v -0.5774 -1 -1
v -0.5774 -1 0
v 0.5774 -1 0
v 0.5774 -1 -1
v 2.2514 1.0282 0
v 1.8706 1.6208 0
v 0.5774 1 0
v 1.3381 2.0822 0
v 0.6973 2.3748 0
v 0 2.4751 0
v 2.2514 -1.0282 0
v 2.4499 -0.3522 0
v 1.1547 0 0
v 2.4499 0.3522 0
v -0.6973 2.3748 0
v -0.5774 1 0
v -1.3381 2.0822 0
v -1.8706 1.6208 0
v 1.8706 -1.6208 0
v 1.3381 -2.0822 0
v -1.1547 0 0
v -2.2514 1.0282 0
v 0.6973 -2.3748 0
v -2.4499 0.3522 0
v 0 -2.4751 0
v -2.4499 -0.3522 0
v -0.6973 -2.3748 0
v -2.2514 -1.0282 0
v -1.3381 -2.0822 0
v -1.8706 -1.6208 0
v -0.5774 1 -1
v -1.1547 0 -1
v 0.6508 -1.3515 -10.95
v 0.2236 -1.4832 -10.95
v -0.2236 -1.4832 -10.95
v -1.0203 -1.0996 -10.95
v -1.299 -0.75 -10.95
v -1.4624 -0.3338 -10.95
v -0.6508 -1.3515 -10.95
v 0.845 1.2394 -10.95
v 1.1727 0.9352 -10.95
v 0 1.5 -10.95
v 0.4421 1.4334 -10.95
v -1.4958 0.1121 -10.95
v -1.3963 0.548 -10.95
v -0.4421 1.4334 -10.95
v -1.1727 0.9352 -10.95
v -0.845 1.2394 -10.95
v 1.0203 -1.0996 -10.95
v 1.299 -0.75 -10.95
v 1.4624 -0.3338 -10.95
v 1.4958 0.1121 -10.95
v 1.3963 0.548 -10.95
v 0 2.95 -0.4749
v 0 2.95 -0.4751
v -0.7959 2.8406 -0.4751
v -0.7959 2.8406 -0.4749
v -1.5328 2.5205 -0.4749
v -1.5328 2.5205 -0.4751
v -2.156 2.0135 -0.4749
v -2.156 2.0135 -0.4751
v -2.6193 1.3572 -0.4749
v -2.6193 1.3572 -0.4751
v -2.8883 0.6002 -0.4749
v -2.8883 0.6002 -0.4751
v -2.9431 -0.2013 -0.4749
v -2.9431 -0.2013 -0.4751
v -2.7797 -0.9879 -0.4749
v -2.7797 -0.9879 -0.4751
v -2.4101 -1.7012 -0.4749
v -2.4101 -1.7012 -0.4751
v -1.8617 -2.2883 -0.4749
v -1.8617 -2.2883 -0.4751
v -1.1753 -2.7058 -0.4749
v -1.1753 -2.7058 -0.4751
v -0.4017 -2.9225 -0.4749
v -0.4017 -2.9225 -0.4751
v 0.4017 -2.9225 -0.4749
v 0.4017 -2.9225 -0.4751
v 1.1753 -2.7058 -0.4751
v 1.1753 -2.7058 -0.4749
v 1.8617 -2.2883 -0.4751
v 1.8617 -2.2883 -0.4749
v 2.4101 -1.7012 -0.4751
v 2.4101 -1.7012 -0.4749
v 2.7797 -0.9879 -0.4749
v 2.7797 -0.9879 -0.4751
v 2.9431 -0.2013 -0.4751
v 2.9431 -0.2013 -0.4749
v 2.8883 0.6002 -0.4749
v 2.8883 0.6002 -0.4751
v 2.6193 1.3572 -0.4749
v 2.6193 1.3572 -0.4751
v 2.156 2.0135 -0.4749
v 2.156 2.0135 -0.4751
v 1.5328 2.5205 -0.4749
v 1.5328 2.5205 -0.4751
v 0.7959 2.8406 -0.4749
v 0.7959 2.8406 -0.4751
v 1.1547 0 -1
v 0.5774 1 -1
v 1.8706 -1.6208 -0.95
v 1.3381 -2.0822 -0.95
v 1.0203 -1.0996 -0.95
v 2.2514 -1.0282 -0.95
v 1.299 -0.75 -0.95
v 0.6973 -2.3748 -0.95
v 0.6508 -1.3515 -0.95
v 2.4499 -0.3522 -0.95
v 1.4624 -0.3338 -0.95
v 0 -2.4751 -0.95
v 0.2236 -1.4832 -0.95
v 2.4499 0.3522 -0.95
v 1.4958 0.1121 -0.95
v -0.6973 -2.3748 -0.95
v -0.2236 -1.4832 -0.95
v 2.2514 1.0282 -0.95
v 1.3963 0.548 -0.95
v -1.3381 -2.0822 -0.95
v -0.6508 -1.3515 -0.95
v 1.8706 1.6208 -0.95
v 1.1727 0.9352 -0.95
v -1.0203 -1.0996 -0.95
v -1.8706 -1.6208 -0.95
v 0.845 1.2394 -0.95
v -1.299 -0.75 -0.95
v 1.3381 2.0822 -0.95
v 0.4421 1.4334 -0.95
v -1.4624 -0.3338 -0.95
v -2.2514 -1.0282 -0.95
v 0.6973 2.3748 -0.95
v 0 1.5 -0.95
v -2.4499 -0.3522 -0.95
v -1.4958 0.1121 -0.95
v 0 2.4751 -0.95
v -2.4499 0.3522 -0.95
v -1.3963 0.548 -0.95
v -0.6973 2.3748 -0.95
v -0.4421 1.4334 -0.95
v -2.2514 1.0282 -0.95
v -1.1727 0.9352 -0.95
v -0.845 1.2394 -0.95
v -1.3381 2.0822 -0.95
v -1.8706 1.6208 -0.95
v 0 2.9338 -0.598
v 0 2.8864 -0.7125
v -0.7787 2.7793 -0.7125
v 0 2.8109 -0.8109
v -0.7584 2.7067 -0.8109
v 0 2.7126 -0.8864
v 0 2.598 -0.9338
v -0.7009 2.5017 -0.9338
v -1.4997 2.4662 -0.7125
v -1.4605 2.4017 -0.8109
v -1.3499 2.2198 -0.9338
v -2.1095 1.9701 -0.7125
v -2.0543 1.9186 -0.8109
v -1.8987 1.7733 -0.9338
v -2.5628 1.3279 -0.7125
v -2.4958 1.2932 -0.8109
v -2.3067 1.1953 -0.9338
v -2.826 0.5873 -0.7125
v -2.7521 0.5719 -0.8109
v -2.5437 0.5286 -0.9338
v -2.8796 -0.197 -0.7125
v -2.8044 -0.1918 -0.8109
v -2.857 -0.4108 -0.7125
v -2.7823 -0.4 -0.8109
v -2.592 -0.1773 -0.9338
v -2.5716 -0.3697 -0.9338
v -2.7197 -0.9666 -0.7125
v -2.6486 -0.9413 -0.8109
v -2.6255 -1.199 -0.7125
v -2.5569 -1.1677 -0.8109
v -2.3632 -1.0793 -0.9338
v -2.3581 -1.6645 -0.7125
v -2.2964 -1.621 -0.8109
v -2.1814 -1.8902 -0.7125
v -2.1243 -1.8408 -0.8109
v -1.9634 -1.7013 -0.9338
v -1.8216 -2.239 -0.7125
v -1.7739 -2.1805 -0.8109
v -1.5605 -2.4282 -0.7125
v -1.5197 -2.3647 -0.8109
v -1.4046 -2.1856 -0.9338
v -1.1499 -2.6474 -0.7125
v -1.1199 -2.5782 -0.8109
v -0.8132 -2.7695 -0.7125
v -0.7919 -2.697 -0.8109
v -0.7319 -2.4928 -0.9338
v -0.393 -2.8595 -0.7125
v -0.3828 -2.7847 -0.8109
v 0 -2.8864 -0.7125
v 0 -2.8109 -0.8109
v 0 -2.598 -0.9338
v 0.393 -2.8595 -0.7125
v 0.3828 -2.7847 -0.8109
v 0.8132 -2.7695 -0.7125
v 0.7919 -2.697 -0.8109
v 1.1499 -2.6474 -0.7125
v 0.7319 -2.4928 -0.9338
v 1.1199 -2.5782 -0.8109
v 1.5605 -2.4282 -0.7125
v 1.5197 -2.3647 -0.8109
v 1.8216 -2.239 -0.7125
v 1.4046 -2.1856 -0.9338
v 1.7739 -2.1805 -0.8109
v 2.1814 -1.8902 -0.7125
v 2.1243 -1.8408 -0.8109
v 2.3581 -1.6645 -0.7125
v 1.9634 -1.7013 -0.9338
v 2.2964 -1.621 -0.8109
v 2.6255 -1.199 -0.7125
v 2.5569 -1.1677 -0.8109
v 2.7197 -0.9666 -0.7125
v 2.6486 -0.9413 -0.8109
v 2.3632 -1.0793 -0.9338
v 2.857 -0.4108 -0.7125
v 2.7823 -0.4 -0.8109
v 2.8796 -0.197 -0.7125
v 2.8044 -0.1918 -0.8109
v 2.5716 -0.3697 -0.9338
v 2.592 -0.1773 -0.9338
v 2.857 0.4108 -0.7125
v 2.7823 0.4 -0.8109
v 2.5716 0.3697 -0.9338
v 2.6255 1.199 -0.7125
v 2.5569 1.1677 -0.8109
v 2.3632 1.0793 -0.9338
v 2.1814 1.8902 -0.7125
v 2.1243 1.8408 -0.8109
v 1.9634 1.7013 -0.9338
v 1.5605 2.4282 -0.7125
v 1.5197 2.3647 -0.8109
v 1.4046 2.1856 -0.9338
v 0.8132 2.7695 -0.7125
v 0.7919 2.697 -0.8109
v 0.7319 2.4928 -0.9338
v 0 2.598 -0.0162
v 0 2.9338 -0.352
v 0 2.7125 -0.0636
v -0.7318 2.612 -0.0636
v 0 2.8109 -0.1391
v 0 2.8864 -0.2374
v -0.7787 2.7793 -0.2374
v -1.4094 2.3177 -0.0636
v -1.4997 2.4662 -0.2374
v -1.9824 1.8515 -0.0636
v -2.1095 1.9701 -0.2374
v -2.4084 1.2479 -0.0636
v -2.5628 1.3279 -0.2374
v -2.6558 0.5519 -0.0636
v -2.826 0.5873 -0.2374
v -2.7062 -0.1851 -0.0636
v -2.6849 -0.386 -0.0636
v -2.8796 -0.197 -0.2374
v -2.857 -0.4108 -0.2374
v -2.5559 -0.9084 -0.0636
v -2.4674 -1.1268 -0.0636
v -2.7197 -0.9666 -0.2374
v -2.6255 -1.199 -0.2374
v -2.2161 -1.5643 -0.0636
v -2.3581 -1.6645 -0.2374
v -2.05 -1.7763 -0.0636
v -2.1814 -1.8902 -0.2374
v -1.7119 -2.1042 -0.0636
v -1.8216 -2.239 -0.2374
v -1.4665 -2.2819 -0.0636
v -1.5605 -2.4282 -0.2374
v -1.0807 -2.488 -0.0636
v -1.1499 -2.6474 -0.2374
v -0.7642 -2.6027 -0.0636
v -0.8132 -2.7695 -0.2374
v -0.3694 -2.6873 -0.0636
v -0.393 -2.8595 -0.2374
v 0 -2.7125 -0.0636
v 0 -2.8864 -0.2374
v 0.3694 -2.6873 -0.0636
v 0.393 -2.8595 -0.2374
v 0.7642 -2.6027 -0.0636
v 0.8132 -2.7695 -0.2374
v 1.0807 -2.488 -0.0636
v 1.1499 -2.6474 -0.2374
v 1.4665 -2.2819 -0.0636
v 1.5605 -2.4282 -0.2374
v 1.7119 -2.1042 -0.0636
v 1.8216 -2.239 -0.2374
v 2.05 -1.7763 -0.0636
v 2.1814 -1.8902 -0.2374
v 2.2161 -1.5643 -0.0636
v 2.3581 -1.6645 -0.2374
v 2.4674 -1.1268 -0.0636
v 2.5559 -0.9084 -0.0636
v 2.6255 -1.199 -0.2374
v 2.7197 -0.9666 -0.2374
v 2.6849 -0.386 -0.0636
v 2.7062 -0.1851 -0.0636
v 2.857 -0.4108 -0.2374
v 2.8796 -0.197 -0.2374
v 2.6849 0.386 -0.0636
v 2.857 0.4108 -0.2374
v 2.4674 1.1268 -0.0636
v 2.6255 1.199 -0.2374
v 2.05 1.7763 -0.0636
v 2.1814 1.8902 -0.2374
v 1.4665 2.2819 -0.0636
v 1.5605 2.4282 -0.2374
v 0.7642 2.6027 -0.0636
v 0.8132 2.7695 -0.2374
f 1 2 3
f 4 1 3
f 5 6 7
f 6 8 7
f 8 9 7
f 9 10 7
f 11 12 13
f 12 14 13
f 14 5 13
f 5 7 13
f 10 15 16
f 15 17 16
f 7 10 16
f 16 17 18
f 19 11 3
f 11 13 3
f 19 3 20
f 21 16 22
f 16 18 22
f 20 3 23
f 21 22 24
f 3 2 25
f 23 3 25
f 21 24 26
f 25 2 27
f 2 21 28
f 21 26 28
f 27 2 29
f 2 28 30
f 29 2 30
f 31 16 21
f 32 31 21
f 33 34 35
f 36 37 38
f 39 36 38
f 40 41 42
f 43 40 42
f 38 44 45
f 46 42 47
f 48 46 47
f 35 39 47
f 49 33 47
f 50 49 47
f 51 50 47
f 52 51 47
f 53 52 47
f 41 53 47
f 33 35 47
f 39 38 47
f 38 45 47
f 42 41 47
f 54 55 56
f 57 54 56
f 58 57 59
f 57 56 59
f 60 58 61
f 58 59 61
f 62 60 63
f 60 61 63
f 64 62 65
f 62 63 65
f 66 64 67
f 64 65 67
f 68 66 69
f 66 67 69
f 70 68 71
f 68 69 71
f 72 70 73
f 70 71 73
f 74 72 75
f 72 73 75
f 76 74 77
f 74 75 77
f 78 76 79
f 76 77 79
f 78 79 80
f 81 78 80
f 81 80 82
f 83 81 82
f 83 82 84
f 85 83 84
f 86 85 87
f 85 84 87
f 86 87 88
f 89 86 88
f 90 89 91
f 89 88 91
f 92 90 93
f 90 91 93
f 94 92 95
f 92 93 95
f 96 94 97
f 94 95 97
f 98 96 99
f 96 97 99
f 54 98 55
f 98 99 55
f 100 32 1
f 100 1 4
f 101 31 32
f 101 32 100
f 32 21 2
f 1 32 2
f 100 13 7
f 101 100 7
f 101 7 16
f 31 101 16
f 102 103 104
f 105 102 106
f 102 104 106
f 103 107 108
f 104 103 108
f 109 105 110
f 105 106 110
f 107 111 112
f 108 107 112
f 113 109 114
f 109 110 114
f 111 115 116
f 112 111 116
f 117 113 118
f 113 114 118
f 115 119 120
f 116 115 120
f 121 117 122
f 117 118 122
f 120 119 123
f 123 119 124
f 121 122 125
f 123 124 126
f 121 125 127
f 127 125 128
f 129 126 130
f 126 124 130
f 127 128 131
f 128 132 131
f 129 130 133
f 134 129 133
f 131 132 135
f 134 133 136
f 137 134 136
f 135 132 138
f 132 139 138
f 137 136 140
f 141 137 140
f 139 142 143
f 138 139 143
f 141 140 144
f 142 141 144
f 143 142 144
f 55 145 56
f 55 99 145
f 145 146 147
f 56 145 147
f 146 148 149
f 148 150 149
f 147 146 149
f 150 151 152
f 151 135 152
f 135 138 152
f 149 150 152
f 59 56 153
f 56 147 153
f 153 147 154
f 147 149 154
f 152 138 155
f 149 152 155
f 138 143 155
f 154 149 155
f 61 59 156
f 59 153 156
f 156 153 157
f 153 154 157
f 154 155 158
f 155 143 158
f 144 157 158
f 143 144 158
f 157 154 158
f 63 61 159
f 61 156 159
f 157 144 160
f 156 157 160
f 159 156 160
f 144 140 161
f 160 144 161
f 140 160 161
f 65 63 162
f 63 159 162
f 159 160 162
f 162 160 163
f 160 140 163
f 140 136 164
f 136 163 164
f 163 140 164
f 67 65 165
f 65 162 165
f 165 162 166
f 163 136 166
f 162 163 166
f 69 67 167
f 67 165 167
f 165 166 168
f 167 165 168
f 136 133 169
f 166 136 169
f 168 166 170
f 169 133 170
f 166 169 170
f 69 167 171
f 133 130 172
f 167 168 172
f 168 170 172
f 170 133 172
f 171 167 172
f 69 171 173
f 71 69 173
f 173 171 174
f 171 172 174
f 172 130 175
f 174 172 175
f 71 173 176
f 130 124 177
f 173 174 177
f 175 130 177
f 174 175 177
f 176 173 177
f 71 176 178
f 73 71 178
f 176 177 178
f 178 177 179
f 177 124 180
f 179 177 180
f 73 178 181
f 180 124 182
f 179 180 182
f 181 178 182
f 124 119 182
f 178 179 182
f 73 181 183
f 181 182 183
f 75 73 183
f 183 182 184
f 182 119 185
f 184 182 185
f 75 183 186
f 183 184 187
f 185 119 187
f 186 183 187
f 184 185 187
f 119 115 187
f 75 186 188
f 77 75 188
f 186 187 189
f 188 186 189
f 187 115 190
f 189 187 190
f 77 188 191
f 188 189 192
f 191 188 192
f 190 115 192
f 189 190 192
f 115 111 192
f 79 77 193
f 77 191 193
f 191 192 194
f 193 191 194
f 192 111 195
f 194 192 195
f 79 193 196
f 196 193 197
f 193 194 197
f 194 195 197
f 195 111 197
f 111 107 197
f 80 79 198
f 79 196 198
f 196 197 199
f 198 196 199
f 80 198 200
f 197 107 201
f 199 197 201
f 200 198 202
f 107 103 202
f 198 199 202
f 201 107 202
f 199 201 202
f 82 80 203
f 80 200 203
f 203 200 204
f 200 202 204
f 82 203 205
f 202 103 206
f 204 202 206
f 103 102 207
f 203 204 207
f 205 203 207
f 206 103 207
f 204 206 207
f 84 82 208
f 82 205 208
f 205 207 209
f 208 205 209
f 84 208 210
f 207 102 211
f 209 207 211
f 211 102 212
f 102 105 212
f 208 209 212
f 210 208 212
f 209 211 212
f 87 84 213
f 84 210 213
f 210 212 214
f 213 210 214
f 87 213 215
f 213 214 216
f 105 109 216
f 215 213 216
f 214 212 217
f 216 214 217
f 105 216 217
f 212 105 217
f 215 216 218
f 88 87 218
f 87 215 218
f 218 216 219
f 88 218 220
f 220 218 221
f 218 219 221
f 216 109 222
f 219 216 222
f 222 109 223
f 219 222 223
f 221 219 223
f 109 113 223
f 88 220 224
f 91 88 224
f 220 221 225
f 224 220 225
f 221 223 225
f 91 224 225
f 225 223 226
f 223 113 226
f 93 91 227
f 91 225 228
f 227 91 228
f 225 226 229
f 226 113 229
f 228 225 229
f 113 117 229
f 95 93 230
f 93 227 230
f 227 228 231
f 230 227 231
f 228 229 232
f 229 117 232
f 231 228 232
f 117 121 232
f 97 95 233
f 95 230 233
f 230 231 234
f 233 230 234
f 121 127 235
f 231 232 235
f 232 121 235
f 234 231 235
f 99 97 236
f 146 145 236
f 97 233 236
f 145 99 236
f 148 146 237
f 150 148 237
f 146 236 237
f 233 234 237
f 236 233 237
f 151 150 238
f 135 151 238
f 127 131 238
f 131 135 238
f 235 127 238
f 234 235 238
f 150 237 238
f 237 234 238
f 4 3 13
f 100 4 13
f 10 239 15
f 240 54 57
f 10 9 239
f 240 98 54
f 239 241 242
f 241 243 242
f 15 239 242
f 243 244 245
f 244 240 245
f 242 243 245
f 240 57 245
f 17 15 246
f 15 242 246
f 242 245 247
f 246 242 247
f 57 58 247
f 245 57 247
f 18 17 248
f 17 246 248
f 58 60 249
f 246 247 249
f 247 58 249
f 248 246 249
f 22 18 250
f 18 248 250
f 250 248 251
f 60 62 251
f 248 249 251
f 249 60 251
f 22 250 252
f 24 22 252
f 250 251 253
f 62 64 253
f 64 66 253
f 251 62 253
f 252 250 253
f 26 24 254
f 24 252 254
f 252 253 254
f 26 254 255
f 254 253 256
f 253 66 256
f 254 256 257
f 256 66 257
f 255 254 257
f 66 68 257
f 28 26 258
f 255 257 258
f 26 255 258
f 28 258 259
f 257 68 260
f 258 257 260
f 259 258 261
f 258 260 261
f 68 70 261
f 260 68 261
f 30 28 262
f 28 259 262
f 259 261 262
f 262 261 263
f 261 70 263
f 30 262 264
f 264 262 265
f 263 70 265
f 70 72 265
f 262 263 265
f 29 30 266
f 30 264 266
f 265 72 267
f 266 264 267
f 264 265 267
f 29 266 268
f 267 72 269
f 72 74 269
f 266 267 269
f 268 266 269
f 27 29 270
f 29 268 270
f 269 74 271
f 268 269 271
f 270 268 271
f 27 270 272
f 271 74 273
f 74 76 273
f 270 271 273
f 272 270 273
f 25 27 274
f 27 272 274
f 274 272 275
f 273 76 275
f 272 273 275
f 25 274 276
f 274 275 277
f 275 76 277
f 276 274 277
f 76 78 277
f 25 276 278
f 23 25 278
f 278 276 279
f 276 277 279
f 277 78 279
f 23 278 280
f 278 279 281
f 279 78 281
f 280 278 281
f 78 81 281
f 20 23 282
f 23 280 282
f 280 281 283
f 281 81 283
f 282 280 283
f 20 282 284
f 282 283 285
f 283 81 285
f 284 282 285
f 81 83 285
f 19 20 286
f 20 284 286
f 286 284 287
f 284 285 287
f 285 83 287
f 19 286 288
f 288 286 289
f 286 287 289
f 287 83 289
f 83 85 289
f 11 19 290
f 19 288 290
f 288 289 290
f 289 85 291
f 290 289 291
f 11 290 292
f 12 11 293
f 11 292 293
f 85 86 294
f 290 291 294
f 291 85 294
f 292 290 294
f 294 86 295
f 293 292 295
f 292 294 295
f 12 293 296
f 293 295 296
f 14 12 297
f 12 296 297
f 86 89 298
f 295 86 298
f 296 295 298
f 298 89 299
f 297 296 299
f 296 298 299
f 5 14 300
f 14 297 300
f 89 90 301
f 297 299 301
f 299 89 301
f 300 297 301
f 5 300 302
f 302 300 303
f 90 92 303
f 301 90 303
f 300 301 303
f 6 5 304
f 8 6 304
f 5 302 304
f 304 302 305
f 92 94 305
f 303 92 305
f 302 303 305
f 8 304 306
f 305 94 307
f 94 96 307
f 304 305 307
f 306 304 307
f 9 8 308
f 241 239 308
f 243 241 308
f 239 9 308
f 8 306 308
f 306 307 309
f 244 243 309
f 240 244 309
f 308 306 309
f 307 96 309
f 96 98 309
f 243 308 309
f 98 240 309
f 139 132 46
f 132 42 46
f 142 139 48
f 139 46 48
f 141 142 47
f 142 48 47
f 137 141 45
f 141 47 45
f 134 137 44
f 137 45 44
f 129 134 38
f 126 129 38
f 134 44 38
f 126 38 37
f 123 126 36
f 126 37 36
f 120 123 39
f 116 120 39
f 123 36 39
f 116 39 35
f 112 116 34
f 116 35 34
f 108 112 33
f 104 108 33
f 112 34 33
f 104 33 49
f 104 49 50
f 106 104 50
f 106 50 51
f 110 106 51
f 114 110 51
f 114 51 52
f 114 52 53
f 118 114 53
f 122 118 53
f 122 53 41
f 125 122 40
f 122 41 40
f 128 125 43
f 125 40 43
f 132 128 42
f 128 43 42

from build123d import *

# Parameters (mm, degrees)
FILLET_1_R          = 0.475
CUT_EXTRUDE_1_DEPTH = 1


with BuildPart() as part:
    # 草图1 → 旋转1 (revolve)
    with BuildSketch(Plane(origin=(0, 0, 0), x_dir=(0, 0, -1), z_dir=(1, 0, 0))):
        Polygon((0, 0), (0, 2.95), (0.95, 2.95), (0.95, 1.5), (10.95, 1.5), (10.95, 0), align=None)
    revolve(axis=Axis((0, 0, -10.95), (0, 0, 1)))

    # 圆角1
    fillet_1_edges = [part.edges().sort_by_distance(p)[0] for p in [
        (0, -2.95, -0.95),
        (0, -2.95, 0),
    ]]
    fillet(fillet_1_edges, radius=FILLET_1_R - 0.0001)  # a hair under: the kernel refuses the full size

    # 草图2 → 切除-拉伸1 (cut)
    with BuildSketch(Plane.XY):
        Polygon((0.577350269, 1), (-0.577350269, 1), (-1.154700538, 0), (-0.577350269, -1), (0.577350269, -1), (1.154700538, 0), align=None)
    extrude(amount=-CUT_EXTRUDE_1_DEPTH, mode=Mode.SUBTRACT)


solid = part.part
